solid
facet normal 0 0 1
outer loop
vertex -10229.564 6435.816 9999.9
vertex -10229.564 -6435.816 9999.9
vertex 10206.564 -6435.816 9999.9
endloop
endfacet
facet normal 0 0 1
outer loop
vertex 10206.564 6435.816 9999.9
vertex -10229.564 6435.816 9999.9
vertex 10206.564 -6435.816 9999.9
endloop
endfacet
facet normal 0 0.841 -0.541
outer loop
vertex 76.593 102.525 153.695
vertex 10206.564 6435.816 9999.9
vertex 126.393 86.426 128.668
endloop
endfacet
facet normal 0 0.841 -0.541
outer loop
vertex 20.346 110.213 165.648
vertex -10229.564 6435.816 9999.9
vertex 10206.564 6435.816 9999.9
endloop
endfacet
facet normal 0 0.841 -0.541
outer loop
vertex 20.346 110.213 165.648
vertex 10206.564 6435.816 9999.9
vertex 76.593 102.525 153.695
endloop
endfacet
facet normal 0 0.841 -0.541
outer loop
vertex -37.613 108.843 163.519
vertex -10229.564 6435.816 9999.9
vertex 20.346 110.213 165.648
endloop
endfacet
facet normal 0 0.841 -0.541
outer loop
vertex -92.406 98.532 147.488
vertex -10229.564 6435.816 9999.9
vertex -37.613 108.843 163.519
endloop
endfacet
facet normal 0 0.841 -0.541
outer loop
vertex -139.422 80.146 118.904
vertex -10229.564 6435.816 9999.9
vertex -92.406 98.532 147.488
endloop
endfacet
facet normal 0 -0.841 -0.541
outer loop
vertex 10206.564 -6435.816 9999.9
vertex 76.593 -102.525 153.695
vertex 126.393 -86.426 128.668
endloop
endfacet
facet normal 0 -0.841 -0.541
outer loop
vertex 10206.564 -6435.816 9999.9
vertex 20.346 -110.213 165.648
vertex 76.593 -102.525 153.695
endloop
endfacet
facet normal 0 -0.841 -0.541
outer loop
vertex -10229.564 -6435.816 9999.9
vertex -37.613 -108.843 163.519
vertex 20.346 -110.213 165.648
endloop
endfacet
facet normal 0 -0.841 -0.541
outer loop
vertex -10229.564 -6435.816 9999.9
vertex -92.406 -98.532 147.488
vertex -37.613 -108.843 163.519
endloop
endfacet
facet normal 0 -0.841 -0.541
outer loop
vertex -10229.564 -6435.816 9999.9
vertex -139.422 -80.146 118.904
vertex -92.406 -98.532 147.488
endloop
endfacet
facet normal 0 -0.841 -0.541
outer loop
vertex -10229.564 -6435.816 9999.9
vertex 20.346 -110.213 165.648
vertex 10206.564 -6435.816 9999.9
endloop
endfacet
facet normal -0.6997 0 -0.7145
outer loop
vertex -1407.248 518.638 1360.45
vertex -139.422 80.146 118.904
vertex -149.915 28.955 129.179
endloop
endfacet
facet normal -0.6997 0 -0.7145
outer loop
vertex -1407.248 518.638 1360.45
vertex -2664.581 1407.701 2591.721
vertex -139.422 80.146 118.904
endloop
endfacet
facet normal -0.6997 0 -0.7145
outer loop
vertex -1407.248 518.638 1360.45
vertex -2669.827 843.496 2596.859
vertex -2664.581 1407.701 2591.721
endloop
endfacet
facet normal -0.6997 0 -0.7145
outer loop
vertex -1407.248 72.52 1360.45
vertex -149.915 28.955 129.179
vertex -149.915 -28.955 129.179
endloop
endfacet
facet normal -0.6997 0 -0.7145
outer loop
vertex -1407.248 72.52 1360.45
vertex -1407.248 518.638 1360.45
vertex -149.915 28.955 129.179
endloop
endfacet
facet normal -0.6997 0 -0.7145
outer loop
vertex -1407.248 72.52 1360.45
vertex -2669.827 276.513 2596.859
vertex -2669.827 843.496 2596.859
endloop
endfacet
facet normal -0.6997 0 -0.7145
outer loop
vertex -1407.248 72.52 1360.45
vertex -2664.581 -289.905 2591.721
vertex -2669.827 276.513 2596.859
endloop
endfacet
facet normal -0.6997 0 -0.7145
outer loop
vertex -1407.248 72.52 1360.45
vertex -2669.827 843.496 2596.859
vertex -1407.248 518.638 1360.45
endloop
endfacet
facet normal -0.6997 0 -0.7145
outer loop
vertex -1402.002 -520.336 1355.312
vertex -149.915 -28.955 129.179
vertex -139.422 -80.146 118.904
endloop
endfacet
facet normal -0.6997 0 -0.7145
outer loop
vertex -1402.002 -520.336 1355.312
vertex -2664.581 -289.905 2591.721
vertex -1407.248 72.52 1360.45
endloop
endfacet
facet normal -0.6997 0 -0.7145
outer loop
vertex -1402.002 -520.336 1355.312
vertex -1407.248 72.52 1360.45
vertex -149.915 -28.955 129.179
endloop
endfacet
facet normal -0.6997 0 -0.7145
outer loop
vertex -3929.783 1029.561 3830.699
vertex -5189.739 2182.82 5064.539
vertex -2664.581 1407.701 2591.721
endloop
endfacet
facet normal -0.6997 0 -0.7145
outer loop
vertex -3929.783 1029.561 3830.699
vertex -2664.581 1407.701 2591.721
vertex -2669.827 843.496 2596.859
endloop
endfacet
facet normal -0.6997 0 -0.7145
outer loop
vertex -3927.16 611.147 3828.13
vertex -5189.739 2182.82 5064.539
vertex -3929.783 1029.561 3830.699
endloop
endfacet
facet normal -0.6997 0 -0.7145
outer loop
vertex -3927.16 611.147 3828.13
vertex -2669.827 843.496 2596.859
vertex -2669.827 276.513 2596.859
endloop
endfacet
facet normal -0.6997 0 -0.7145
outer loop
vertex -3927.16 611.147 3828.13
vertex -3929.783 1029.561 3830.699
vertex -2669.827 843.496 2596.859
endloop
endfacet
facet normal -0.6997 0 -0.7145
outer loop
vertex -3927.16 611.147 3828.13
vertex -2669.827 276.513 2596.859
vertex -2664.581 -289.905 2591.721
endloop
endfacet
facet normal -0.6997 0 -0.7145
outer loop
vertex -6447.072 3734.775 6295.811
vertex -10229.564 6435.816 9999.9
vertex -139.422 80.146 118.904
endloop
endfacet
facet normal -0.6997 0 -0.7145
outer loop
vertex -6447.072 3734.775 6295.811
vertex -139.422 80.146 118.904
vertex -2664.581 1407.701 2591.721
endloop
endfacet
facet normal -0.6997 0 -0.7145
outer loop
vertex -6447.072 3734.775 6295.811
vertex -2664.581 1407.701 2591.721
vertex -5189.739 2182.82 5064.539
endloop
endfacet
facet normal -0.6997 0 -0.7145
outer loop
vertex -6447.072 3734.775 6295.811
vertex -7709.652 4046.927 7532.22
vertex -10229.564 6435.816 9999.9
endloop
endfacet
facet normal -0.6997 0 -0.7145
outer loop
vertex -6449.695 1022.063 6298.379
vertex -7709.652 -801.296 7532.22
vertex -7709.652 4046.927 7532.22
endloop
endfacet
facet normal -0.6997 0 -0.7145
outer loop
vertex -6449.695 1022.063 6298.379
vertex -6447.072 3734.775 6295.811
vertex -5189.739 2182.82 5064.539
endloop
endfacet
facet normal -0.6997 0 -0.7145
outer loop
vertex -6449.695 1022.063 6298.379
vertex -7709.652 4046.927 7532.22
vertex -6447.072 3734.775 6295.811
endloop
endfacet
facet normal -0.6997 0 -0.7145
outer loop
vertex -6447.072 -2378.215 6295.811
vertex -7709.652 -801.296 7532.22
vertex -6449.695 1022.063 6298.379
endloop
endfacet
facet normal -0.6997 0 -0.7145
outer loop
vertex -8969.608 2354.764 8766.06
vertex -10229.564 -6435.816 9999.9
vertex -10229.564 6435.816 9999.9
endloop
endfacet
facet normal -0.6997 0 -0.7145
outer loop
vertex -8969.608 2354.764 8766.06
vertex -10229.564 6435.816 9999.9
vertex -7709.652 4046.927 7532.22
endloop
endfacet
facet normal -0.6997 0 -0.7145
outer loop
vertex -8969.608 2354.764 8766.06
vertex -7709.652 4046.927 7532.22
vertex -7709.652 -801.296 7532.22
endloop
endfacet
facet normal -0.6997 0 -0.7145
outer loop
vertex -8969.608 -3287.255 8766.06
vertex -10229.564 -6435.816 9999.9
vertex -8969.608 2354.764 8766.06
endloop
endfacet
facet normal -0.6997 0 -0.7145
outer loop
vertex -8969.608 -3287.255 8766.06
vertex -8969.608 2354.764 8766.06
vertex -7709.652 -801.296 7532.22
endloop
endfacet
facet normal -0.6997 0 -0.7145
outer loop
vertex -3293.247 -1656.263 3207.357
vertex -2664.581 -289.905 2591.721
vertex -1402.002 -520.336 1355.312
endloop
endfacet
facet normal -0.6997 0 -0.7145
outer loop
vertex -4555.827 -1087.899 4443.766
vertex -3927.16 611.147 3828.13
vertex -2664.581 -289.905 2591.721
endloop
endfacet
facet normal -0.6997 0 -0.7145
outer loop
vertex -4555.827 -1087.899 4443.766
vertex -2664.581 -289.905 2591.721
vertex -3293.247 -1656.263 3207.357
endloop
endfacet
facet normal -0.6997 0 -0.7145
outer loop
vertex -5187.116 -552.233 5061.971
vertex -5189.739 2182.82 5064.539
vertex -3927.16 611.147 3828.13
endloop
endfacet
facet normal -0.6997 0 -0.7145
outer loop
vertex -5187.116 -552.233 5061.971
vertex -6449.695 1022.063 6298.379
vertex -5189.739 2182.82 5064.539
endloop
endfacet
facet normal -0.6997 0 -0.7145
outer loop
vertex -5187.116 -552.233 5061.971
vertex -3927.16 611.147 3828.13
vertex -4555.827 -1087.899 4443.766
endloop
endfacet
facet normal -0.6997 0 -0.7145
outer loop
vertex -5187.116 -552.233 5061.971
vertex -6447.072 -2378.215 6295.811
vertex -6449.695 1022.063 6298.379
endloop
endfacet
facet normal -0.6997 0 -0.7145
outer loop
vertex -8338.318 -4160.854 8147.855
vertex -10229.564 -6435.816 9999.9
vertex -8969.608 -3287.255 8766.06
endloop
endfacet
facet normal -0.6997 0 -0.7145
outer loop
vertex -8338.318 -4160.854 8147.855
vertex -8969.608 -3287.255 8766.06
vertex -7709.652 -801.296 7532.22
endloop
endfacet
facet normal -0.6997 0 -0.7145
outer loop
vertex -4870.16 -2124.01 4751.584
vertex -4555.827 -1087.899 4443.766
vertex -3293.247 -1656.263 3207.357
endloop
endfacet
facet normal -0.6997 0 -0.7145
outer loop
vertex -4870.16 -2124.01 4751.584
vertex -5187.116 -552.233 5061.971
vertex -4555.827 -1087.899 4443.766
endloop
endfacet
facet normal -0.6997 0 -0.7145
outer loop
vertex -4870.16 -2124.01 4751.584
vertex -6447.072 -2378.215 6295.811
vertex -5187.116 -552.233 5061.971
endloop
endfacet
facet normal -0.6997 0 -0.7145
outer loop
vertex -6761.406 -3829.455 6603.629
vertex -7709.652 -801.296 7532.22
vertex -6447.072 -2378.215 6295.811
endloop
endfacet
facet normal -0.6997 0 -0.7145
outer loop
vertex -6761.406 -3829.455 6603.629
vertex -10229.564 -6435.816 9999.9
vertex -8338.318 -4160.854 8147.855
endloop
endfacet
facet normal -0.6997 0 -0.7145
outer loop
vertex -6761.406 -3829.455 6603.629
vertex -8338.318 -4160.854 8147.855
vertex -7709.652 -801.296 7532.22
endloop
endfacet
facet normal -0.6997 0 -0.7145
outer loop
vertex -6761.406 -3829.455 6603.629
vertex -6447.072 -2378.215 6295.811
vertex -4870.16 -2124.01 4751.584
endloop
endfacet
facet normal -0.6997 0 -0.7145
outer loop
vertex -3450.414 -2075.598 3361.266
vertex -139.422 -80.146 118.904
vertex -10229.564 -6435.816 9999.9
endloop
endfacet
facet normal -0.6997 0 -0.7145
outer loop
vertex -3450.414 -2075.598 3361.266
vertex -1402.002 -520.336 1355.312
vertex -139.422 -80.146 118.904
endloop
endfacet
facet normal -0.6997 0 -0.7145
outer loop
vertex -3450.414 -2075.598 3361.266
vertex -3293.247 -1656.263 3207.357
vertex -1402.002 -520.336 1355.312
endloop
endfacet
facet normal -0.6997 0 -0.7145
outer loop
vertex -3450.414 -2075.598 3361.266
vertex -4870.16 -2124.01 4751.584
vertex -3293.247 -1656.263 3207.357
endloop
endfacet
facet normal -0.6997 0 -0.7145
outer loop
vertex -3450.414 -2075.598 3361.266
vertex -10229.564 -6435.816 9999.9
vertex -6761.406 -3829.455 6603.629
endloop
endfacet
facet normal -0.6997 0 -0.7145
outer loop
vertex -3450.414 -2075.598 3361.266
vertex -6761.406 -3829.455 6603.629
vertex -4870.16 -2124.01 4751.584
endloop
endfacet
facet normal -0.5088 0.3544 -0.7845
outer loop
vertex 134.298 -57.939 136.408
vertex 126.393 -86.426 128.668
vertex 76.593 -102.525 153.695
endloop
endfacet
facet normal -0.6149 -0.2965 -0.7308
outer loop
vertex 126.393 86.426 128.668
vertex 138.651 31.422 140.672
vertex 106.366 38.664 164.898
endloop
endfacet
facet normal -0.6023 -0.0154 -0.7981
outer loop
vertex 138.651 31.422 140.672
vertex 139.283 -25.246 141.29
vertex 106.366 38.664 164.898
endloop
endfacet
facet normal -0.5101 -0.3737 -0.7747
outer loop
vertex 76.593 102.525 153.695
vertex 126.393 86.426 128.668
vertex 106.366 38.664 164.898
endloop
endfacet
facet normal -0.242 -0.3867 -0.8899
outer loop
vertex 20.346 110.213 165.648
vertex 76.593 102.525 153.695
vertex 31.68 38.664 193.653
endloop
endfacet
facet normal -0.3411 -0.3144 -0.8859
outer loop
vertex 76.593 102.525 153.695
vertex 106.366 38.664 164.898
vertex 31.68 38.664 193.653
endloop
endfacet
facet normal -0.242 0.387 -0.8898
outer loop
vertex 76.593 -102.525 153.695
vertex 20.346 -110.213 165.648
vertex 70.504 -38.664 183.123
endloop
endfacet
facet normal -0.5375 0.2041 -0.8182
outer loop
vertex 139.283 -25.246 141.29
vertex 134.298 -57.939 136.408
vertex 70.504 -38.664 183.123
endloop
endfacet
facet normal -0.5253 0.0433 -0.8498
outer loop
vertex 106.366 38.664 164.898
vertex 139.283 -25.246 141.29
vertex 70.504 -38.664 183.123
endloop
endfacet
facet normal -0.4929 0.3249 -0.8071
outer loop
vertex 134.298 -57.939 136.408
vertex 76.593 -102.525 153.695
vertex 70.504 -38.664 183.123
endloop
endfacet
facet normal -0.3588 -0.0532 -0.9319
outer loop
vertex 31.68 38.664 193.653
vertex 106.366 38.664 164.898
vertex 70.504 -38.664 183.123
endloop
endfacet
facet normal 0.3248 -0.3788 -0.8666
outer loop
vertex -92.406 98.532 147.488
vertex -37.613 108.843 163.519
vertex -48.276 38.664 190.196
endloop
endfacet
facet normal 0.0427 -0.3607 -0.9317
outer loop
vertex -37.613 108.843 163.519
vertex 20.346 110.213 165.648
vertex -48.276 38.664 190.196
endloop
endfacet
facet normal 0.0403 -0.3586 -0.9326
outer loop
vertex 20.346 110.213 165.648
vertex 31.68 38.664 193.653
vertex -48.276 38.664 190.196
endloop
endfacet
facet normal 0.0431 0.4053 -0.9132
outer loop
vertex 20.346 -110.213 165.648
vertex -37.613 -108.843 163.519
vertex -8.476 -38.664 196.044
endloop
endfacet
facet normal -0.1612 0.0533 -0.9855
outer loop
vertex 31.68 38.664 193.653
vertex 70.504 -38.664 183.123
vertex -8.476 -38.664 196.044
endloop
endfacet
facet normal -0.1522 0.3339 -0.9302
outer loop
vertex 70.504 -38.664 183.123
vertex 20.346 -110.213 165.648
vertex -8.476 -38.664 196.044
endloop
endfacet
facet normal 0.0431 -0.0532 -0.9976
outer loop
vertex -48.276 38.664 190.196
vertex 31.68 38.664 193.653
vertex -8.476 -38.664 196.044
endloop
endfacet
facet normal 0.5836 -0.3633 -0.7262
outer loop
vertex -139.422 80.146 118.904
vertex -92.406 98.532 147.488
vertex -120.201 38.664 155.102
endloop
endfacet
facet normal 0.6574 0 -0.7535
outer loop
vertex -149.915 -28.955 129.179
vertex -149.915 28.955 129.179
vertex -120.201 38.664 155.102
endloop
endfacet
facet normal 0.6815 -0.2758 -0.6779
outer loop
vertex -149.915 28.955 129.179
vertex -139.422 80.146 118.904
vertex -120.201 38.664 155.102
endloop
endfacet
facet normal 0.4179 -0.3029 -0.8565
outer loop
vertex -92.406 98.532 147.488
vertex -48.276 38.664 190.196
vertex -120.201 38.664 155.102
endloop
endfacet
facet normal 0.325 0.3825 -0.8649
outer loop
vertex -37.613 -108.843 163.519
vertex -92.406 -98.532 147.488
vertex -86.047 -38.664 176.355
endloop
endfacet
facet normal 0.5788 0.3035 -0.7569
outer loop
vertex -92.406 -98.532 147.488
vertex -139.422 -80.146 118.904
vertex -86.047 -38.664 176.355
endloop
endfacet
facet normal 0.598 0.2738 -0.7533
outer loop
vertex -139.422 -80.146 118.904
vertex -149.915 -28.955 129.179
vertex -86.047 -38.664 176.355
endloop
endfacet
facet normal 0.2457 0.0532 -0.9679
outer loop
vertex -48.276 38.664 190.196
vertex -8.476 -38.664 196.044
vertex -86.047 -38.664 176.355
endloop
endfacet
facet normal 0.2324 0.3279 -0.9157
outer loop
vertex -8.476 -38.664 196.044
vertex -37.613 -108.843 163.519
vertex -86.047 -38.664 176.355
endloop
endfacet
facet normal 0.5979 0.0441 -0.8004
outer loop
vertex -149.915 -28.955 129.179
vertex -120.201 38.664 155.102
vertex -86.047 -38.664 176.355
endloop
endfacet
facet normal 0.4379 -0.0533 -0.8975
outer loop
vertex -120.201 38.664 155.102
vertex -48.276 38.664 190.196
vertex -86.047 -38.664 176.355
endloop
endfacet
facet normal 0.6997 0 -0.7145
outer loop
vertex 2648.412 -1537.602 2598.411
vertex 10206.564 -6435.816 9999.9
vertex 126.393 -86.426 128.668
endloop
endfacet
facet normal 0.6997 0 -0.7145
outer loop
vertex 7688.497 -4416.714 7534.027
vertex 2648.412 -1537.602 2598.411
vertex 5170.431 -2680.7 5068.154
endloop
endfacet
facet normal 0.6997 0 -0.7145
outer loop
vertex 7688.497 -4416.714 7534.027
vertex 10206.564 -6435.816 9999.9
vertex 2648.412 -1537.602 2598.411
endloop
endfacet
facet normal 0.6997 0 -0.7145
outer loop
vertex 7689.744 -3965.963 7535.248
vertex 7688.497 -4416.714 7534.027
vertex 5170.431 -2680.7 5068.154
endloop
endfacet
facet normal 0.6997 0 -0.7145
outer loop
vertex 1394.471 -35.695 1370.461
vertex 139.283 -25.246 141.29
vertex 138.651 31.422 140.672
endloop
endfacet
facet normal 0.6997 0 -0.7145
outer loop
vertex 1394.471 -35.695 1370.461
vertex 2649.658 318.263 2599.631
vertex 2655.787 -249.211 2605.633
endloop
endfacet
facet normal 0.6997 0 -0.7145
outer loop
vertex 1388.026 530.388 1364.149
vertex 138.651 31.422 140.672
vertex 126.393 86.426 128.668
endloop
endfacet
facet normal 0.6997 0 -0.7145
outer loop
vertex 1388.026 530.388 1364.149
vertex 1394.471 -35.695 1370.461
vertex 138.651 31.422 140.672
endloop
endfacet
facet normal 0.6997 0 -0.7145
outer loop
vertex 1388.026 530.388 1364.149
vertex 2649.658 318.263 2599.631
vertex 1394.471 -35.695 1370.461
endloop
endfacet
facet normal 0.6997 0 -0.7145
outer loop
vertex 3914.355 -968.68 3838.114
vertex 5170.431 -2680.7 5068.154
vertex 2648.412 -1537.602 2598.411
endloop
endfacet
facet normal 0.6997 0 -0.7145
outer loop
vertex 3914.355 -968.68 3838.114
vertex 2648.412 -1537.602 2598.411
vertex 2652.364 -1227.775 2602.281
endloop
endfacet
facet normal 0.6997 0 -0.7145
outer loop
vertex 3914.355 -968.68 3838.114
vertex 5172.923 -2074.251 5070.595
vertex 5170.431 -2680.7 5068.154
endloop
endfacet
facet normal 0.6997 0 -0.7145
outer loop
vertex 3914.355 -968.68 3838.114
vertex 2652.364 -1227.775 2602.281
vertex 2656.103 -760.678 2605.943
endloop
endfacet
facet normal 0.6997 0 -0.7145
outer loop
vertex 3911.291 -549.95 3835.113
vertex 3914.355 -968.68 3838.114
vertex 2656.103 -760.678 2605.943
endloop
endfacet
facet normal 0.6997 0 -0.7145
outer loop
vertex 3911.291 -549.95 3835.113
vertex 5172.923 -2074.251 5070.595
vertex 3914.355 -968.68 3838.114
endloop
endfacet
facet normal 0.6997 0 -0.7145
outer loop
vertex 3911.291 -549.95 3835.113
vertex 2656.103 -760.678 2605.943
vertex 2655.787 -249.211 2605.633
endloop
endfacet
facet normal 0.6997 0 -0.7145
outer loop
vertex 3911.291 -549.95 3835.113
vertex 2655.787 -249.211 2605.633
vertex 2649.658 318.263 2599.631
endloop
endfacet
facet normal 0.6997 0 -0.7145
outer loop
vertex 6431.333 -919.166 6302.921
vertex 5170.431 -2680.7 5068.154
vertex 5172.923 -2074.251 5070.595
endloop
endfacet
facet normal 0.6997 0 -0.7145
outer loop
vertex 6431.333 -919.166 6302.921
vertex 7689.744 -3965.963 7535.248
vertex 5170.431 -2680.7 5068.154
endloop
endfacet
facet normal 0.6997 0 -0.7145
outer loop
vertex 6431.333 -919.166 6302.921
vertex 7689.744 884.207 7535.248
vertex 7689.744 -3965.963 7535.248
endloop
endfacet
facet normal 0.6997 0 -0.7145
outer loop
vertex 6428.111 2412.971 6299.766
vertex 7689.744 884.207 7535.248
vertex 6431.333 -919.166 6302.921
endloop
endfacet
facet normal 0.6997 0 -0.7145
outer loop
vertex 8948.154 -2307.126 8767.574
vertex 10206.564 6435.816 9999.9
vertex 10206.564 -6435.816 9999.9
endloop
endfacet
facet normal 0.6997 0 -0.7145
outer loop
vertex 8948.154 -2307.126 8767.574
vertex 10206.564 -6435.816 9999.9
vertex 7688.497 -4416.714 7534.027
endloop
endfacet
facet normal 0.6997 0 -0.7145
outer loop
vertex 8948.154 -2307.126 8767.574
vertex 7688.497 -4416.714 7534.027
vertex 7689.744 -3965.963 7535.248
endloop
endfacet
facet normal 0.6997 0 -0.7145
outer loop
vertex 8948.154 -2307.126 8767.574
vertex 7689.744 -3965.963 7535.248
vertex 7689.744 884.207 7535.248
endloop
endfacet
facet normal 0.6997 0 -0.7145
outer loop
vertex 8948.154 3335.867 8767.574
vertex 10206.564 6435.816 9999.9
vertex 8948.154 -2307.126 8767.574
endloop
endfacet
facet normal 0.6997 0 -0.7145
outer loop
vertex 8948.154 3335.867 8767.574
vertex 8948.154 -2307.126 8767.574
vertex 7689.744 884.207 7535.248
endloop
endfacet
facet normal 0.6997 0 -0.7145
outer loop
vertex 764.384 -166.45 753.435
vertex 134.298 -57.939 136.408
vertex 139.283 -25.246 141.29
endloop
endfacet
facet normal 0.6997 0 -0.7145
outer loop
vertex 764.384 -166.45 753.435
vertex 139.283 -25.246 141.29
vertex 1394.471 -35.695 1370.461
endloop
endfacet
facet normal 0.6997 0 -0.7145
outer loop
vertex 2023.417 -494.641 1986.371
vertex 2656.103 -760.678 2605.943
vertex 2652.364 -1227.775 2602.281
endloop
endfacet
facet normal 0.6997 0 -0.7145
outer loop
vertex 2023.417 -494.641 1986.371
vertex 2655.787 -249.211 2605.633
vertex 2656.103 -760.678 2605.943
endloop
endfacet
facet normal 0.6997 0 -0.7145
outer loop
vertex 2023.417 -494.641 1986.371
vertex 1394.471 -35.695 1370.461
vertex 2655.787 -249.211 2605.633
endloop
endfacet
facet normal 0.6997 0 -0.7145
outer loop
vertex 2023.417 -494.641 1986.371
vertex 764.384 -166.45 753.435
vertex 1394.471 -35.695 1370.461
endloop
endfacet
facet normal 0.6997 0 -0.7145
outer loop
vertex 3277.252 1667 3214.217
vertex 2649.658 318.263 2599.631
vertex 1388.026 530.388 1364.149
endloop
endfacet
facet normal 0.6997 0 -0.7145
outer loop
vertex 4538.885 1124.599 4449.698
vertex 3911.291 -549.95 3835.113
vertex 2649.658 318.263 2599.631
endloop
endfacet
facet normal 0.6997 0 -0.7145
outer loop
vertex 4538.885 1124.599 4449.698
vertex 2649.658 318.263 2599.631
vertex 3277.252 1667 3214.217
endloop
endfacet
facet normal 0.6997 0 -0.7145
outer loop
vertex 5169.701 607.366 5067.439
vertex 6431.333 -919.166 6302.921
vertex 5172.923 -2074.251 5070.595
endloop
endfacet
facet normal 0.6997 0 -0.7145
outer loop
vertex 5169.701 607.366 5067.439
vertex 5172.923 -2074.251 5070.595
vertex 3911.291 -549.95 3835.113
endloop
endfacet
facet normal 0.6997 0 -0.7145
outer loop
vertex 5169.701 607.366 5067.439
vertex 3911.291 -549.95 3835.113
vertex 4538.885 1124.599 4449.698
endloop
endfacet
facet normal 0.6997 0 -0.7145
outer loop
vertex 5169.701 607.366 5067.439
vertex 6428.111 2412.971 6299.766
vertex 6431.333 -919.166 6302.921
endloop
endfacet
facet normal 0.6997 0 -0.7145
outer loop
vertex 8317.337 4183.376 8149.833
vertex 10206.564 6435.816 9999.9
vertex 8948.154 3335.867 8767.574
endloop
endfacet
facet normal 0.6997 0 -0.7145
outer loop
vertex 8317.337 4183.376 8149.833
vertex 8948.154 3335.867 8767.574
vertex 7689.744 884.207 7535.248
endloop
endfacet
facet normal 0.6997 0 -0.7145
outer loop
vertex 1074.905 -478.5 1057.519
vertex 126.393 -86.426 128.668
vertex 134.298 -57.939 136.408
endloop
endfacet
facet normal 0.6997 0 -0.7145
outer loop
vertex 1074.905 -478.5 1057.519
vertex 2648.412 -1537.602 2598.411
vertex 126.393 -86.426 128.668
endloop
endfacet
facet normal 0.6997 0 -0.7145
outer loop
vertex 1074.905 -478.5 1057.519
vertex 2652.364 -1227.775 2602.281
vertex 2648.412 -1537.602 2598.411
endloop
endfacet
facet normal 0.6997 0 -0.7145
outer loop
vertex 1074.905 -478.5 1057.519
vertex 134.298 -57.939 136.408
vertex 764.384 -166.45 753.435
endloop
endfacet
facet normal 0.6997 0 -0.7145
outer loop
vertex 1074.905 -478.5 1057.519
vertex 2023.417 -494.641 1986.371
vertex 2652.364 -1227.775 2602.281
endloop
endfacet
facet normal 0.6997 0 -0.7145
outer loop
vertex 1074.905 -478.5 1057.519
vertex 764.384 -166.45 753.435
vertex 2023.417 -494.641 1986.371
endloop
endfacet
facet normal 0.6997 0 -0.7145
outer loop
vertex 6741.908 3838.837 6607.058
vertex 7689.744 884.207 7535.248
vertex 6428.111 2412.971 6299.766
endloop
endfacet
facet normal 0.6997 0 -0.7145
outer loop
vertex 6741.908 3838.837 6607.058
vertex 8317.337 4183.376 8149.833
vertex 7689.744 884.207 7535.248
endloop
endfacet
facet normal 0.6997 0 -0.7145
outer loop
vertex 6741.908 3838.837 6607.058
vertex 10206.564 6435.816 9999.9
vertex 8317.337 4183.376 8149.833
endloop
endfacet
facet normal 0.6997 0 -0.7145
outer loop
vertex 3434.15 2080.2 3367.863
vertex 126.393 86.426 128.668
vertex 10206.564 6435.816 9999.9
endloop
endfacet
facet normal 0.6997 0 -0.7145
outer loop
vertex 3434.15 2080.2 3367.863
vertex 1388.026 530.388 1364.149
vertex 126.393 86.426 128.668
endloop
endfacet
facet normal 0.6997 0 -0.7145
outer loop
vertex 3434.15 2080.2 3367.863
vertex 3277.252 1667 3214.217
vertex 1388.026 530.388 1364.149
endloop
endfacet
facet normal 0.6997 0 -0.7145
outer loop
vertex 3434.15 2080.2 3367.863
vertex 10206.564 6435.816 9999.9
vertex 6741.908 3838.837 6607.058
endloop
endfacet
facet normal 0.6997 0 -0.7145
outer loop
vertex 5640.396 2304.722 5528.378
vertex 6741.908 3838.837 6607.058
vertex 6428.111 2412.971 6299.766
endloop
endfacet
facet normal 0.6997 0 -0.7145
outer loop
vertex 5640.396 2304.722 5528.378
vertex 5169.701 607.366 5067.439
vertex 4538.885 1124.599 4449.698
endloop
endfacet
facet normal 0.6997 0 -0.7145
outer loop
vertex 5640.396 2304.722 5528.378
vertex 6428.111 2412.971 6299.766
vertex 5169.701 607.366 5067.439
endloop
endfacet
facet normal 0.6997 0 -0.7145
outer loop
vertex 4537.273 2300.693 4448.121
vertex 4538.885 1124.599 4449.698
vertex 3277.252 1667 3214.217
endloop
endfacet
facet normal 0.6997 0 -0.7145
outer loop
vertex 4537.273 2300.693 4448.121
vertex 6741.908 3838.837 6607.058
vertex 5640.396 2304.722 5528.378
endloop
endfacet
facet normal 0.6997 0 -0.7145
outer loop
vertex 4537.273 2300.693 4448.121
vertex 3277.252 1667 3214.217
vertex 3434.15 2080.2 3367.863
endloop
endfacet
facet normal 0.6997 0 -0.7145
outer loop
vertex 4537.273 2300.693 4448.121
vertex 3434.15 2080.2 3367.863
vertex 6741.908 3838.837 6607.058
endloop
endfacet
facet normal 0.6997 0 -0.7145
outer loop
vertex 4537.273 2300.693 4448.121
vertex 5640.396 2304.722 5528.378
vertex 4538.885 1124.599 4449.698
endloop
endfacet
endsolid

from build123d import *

# Parameters (mm, degrees)
SKETCH1_W               = 12.8
SKETCH1_H               = 7.2
BOSS_EXTRUDE1_DEPTH     = 10000
BOSS_EXTRUDE1_TAPER     = -45.6
CUT_EXTRUDE1_DEPTH      = 17579.213488948
CUT_EXTRUDE1_DEPTH_BACK = 17579.213488948


with BuildPart() as part:
    # Sketch1 → Boss-Extrude1 (new body)
    with BuildSketch(Plane.XY.offset(-0.1)):
        with Locations((-11.5, 0)):
            Rectangle(SKETCH1_W, SKETCH1_H)
    extrude(amount=BOSS_EXTRUDE1_DEPTH, taper=BOSS_EXTRUDE1_TAPER)

    # Sketch2 → Cut-Extrude1 (cut, two sides: drawn at the far end of the back side and taken through both)
    with BuildSketch(Plane(origin=(0, 0, 0), x_dir=(0, -1, 0), z_dir=(1, 0, 0)).offset(-CUT_EXTRUDE1_DEPTH_BACK)):
        Polygon((-12631.780949959, -19632.606169723), (-3.6, 0.1), (3.6, 0.1), (12631.780949959, -19632.606169723), (22327.50273382, 5804.710423836), (-20603.431761532, 5804.710423836), align=None)
    extrude(amount=CUT_EXTRUDE1_DEPTH + CUT_EXTRUDE1_DEPTH_BACK, mode=Mode.SUBTRACT)

    # Sketch4 → Cut-Revolve3 (revolve, cut)
    with BuildSketch(Plane(origin=(0, 0, 0), x_dir=(0, 0, -1), z_dir=(1, 0, 0))):
        with BuildLine():
            Line((0, -200), (0, 200))
            ThreePointArc((0, 200), (-200, 0), (0, -200))
        make_face()
    revolve(axis=Axis((0, 3540.008208747, 0), (0, -1, 0)), mode=Mode.SUBTRACT)


solid = part.part
